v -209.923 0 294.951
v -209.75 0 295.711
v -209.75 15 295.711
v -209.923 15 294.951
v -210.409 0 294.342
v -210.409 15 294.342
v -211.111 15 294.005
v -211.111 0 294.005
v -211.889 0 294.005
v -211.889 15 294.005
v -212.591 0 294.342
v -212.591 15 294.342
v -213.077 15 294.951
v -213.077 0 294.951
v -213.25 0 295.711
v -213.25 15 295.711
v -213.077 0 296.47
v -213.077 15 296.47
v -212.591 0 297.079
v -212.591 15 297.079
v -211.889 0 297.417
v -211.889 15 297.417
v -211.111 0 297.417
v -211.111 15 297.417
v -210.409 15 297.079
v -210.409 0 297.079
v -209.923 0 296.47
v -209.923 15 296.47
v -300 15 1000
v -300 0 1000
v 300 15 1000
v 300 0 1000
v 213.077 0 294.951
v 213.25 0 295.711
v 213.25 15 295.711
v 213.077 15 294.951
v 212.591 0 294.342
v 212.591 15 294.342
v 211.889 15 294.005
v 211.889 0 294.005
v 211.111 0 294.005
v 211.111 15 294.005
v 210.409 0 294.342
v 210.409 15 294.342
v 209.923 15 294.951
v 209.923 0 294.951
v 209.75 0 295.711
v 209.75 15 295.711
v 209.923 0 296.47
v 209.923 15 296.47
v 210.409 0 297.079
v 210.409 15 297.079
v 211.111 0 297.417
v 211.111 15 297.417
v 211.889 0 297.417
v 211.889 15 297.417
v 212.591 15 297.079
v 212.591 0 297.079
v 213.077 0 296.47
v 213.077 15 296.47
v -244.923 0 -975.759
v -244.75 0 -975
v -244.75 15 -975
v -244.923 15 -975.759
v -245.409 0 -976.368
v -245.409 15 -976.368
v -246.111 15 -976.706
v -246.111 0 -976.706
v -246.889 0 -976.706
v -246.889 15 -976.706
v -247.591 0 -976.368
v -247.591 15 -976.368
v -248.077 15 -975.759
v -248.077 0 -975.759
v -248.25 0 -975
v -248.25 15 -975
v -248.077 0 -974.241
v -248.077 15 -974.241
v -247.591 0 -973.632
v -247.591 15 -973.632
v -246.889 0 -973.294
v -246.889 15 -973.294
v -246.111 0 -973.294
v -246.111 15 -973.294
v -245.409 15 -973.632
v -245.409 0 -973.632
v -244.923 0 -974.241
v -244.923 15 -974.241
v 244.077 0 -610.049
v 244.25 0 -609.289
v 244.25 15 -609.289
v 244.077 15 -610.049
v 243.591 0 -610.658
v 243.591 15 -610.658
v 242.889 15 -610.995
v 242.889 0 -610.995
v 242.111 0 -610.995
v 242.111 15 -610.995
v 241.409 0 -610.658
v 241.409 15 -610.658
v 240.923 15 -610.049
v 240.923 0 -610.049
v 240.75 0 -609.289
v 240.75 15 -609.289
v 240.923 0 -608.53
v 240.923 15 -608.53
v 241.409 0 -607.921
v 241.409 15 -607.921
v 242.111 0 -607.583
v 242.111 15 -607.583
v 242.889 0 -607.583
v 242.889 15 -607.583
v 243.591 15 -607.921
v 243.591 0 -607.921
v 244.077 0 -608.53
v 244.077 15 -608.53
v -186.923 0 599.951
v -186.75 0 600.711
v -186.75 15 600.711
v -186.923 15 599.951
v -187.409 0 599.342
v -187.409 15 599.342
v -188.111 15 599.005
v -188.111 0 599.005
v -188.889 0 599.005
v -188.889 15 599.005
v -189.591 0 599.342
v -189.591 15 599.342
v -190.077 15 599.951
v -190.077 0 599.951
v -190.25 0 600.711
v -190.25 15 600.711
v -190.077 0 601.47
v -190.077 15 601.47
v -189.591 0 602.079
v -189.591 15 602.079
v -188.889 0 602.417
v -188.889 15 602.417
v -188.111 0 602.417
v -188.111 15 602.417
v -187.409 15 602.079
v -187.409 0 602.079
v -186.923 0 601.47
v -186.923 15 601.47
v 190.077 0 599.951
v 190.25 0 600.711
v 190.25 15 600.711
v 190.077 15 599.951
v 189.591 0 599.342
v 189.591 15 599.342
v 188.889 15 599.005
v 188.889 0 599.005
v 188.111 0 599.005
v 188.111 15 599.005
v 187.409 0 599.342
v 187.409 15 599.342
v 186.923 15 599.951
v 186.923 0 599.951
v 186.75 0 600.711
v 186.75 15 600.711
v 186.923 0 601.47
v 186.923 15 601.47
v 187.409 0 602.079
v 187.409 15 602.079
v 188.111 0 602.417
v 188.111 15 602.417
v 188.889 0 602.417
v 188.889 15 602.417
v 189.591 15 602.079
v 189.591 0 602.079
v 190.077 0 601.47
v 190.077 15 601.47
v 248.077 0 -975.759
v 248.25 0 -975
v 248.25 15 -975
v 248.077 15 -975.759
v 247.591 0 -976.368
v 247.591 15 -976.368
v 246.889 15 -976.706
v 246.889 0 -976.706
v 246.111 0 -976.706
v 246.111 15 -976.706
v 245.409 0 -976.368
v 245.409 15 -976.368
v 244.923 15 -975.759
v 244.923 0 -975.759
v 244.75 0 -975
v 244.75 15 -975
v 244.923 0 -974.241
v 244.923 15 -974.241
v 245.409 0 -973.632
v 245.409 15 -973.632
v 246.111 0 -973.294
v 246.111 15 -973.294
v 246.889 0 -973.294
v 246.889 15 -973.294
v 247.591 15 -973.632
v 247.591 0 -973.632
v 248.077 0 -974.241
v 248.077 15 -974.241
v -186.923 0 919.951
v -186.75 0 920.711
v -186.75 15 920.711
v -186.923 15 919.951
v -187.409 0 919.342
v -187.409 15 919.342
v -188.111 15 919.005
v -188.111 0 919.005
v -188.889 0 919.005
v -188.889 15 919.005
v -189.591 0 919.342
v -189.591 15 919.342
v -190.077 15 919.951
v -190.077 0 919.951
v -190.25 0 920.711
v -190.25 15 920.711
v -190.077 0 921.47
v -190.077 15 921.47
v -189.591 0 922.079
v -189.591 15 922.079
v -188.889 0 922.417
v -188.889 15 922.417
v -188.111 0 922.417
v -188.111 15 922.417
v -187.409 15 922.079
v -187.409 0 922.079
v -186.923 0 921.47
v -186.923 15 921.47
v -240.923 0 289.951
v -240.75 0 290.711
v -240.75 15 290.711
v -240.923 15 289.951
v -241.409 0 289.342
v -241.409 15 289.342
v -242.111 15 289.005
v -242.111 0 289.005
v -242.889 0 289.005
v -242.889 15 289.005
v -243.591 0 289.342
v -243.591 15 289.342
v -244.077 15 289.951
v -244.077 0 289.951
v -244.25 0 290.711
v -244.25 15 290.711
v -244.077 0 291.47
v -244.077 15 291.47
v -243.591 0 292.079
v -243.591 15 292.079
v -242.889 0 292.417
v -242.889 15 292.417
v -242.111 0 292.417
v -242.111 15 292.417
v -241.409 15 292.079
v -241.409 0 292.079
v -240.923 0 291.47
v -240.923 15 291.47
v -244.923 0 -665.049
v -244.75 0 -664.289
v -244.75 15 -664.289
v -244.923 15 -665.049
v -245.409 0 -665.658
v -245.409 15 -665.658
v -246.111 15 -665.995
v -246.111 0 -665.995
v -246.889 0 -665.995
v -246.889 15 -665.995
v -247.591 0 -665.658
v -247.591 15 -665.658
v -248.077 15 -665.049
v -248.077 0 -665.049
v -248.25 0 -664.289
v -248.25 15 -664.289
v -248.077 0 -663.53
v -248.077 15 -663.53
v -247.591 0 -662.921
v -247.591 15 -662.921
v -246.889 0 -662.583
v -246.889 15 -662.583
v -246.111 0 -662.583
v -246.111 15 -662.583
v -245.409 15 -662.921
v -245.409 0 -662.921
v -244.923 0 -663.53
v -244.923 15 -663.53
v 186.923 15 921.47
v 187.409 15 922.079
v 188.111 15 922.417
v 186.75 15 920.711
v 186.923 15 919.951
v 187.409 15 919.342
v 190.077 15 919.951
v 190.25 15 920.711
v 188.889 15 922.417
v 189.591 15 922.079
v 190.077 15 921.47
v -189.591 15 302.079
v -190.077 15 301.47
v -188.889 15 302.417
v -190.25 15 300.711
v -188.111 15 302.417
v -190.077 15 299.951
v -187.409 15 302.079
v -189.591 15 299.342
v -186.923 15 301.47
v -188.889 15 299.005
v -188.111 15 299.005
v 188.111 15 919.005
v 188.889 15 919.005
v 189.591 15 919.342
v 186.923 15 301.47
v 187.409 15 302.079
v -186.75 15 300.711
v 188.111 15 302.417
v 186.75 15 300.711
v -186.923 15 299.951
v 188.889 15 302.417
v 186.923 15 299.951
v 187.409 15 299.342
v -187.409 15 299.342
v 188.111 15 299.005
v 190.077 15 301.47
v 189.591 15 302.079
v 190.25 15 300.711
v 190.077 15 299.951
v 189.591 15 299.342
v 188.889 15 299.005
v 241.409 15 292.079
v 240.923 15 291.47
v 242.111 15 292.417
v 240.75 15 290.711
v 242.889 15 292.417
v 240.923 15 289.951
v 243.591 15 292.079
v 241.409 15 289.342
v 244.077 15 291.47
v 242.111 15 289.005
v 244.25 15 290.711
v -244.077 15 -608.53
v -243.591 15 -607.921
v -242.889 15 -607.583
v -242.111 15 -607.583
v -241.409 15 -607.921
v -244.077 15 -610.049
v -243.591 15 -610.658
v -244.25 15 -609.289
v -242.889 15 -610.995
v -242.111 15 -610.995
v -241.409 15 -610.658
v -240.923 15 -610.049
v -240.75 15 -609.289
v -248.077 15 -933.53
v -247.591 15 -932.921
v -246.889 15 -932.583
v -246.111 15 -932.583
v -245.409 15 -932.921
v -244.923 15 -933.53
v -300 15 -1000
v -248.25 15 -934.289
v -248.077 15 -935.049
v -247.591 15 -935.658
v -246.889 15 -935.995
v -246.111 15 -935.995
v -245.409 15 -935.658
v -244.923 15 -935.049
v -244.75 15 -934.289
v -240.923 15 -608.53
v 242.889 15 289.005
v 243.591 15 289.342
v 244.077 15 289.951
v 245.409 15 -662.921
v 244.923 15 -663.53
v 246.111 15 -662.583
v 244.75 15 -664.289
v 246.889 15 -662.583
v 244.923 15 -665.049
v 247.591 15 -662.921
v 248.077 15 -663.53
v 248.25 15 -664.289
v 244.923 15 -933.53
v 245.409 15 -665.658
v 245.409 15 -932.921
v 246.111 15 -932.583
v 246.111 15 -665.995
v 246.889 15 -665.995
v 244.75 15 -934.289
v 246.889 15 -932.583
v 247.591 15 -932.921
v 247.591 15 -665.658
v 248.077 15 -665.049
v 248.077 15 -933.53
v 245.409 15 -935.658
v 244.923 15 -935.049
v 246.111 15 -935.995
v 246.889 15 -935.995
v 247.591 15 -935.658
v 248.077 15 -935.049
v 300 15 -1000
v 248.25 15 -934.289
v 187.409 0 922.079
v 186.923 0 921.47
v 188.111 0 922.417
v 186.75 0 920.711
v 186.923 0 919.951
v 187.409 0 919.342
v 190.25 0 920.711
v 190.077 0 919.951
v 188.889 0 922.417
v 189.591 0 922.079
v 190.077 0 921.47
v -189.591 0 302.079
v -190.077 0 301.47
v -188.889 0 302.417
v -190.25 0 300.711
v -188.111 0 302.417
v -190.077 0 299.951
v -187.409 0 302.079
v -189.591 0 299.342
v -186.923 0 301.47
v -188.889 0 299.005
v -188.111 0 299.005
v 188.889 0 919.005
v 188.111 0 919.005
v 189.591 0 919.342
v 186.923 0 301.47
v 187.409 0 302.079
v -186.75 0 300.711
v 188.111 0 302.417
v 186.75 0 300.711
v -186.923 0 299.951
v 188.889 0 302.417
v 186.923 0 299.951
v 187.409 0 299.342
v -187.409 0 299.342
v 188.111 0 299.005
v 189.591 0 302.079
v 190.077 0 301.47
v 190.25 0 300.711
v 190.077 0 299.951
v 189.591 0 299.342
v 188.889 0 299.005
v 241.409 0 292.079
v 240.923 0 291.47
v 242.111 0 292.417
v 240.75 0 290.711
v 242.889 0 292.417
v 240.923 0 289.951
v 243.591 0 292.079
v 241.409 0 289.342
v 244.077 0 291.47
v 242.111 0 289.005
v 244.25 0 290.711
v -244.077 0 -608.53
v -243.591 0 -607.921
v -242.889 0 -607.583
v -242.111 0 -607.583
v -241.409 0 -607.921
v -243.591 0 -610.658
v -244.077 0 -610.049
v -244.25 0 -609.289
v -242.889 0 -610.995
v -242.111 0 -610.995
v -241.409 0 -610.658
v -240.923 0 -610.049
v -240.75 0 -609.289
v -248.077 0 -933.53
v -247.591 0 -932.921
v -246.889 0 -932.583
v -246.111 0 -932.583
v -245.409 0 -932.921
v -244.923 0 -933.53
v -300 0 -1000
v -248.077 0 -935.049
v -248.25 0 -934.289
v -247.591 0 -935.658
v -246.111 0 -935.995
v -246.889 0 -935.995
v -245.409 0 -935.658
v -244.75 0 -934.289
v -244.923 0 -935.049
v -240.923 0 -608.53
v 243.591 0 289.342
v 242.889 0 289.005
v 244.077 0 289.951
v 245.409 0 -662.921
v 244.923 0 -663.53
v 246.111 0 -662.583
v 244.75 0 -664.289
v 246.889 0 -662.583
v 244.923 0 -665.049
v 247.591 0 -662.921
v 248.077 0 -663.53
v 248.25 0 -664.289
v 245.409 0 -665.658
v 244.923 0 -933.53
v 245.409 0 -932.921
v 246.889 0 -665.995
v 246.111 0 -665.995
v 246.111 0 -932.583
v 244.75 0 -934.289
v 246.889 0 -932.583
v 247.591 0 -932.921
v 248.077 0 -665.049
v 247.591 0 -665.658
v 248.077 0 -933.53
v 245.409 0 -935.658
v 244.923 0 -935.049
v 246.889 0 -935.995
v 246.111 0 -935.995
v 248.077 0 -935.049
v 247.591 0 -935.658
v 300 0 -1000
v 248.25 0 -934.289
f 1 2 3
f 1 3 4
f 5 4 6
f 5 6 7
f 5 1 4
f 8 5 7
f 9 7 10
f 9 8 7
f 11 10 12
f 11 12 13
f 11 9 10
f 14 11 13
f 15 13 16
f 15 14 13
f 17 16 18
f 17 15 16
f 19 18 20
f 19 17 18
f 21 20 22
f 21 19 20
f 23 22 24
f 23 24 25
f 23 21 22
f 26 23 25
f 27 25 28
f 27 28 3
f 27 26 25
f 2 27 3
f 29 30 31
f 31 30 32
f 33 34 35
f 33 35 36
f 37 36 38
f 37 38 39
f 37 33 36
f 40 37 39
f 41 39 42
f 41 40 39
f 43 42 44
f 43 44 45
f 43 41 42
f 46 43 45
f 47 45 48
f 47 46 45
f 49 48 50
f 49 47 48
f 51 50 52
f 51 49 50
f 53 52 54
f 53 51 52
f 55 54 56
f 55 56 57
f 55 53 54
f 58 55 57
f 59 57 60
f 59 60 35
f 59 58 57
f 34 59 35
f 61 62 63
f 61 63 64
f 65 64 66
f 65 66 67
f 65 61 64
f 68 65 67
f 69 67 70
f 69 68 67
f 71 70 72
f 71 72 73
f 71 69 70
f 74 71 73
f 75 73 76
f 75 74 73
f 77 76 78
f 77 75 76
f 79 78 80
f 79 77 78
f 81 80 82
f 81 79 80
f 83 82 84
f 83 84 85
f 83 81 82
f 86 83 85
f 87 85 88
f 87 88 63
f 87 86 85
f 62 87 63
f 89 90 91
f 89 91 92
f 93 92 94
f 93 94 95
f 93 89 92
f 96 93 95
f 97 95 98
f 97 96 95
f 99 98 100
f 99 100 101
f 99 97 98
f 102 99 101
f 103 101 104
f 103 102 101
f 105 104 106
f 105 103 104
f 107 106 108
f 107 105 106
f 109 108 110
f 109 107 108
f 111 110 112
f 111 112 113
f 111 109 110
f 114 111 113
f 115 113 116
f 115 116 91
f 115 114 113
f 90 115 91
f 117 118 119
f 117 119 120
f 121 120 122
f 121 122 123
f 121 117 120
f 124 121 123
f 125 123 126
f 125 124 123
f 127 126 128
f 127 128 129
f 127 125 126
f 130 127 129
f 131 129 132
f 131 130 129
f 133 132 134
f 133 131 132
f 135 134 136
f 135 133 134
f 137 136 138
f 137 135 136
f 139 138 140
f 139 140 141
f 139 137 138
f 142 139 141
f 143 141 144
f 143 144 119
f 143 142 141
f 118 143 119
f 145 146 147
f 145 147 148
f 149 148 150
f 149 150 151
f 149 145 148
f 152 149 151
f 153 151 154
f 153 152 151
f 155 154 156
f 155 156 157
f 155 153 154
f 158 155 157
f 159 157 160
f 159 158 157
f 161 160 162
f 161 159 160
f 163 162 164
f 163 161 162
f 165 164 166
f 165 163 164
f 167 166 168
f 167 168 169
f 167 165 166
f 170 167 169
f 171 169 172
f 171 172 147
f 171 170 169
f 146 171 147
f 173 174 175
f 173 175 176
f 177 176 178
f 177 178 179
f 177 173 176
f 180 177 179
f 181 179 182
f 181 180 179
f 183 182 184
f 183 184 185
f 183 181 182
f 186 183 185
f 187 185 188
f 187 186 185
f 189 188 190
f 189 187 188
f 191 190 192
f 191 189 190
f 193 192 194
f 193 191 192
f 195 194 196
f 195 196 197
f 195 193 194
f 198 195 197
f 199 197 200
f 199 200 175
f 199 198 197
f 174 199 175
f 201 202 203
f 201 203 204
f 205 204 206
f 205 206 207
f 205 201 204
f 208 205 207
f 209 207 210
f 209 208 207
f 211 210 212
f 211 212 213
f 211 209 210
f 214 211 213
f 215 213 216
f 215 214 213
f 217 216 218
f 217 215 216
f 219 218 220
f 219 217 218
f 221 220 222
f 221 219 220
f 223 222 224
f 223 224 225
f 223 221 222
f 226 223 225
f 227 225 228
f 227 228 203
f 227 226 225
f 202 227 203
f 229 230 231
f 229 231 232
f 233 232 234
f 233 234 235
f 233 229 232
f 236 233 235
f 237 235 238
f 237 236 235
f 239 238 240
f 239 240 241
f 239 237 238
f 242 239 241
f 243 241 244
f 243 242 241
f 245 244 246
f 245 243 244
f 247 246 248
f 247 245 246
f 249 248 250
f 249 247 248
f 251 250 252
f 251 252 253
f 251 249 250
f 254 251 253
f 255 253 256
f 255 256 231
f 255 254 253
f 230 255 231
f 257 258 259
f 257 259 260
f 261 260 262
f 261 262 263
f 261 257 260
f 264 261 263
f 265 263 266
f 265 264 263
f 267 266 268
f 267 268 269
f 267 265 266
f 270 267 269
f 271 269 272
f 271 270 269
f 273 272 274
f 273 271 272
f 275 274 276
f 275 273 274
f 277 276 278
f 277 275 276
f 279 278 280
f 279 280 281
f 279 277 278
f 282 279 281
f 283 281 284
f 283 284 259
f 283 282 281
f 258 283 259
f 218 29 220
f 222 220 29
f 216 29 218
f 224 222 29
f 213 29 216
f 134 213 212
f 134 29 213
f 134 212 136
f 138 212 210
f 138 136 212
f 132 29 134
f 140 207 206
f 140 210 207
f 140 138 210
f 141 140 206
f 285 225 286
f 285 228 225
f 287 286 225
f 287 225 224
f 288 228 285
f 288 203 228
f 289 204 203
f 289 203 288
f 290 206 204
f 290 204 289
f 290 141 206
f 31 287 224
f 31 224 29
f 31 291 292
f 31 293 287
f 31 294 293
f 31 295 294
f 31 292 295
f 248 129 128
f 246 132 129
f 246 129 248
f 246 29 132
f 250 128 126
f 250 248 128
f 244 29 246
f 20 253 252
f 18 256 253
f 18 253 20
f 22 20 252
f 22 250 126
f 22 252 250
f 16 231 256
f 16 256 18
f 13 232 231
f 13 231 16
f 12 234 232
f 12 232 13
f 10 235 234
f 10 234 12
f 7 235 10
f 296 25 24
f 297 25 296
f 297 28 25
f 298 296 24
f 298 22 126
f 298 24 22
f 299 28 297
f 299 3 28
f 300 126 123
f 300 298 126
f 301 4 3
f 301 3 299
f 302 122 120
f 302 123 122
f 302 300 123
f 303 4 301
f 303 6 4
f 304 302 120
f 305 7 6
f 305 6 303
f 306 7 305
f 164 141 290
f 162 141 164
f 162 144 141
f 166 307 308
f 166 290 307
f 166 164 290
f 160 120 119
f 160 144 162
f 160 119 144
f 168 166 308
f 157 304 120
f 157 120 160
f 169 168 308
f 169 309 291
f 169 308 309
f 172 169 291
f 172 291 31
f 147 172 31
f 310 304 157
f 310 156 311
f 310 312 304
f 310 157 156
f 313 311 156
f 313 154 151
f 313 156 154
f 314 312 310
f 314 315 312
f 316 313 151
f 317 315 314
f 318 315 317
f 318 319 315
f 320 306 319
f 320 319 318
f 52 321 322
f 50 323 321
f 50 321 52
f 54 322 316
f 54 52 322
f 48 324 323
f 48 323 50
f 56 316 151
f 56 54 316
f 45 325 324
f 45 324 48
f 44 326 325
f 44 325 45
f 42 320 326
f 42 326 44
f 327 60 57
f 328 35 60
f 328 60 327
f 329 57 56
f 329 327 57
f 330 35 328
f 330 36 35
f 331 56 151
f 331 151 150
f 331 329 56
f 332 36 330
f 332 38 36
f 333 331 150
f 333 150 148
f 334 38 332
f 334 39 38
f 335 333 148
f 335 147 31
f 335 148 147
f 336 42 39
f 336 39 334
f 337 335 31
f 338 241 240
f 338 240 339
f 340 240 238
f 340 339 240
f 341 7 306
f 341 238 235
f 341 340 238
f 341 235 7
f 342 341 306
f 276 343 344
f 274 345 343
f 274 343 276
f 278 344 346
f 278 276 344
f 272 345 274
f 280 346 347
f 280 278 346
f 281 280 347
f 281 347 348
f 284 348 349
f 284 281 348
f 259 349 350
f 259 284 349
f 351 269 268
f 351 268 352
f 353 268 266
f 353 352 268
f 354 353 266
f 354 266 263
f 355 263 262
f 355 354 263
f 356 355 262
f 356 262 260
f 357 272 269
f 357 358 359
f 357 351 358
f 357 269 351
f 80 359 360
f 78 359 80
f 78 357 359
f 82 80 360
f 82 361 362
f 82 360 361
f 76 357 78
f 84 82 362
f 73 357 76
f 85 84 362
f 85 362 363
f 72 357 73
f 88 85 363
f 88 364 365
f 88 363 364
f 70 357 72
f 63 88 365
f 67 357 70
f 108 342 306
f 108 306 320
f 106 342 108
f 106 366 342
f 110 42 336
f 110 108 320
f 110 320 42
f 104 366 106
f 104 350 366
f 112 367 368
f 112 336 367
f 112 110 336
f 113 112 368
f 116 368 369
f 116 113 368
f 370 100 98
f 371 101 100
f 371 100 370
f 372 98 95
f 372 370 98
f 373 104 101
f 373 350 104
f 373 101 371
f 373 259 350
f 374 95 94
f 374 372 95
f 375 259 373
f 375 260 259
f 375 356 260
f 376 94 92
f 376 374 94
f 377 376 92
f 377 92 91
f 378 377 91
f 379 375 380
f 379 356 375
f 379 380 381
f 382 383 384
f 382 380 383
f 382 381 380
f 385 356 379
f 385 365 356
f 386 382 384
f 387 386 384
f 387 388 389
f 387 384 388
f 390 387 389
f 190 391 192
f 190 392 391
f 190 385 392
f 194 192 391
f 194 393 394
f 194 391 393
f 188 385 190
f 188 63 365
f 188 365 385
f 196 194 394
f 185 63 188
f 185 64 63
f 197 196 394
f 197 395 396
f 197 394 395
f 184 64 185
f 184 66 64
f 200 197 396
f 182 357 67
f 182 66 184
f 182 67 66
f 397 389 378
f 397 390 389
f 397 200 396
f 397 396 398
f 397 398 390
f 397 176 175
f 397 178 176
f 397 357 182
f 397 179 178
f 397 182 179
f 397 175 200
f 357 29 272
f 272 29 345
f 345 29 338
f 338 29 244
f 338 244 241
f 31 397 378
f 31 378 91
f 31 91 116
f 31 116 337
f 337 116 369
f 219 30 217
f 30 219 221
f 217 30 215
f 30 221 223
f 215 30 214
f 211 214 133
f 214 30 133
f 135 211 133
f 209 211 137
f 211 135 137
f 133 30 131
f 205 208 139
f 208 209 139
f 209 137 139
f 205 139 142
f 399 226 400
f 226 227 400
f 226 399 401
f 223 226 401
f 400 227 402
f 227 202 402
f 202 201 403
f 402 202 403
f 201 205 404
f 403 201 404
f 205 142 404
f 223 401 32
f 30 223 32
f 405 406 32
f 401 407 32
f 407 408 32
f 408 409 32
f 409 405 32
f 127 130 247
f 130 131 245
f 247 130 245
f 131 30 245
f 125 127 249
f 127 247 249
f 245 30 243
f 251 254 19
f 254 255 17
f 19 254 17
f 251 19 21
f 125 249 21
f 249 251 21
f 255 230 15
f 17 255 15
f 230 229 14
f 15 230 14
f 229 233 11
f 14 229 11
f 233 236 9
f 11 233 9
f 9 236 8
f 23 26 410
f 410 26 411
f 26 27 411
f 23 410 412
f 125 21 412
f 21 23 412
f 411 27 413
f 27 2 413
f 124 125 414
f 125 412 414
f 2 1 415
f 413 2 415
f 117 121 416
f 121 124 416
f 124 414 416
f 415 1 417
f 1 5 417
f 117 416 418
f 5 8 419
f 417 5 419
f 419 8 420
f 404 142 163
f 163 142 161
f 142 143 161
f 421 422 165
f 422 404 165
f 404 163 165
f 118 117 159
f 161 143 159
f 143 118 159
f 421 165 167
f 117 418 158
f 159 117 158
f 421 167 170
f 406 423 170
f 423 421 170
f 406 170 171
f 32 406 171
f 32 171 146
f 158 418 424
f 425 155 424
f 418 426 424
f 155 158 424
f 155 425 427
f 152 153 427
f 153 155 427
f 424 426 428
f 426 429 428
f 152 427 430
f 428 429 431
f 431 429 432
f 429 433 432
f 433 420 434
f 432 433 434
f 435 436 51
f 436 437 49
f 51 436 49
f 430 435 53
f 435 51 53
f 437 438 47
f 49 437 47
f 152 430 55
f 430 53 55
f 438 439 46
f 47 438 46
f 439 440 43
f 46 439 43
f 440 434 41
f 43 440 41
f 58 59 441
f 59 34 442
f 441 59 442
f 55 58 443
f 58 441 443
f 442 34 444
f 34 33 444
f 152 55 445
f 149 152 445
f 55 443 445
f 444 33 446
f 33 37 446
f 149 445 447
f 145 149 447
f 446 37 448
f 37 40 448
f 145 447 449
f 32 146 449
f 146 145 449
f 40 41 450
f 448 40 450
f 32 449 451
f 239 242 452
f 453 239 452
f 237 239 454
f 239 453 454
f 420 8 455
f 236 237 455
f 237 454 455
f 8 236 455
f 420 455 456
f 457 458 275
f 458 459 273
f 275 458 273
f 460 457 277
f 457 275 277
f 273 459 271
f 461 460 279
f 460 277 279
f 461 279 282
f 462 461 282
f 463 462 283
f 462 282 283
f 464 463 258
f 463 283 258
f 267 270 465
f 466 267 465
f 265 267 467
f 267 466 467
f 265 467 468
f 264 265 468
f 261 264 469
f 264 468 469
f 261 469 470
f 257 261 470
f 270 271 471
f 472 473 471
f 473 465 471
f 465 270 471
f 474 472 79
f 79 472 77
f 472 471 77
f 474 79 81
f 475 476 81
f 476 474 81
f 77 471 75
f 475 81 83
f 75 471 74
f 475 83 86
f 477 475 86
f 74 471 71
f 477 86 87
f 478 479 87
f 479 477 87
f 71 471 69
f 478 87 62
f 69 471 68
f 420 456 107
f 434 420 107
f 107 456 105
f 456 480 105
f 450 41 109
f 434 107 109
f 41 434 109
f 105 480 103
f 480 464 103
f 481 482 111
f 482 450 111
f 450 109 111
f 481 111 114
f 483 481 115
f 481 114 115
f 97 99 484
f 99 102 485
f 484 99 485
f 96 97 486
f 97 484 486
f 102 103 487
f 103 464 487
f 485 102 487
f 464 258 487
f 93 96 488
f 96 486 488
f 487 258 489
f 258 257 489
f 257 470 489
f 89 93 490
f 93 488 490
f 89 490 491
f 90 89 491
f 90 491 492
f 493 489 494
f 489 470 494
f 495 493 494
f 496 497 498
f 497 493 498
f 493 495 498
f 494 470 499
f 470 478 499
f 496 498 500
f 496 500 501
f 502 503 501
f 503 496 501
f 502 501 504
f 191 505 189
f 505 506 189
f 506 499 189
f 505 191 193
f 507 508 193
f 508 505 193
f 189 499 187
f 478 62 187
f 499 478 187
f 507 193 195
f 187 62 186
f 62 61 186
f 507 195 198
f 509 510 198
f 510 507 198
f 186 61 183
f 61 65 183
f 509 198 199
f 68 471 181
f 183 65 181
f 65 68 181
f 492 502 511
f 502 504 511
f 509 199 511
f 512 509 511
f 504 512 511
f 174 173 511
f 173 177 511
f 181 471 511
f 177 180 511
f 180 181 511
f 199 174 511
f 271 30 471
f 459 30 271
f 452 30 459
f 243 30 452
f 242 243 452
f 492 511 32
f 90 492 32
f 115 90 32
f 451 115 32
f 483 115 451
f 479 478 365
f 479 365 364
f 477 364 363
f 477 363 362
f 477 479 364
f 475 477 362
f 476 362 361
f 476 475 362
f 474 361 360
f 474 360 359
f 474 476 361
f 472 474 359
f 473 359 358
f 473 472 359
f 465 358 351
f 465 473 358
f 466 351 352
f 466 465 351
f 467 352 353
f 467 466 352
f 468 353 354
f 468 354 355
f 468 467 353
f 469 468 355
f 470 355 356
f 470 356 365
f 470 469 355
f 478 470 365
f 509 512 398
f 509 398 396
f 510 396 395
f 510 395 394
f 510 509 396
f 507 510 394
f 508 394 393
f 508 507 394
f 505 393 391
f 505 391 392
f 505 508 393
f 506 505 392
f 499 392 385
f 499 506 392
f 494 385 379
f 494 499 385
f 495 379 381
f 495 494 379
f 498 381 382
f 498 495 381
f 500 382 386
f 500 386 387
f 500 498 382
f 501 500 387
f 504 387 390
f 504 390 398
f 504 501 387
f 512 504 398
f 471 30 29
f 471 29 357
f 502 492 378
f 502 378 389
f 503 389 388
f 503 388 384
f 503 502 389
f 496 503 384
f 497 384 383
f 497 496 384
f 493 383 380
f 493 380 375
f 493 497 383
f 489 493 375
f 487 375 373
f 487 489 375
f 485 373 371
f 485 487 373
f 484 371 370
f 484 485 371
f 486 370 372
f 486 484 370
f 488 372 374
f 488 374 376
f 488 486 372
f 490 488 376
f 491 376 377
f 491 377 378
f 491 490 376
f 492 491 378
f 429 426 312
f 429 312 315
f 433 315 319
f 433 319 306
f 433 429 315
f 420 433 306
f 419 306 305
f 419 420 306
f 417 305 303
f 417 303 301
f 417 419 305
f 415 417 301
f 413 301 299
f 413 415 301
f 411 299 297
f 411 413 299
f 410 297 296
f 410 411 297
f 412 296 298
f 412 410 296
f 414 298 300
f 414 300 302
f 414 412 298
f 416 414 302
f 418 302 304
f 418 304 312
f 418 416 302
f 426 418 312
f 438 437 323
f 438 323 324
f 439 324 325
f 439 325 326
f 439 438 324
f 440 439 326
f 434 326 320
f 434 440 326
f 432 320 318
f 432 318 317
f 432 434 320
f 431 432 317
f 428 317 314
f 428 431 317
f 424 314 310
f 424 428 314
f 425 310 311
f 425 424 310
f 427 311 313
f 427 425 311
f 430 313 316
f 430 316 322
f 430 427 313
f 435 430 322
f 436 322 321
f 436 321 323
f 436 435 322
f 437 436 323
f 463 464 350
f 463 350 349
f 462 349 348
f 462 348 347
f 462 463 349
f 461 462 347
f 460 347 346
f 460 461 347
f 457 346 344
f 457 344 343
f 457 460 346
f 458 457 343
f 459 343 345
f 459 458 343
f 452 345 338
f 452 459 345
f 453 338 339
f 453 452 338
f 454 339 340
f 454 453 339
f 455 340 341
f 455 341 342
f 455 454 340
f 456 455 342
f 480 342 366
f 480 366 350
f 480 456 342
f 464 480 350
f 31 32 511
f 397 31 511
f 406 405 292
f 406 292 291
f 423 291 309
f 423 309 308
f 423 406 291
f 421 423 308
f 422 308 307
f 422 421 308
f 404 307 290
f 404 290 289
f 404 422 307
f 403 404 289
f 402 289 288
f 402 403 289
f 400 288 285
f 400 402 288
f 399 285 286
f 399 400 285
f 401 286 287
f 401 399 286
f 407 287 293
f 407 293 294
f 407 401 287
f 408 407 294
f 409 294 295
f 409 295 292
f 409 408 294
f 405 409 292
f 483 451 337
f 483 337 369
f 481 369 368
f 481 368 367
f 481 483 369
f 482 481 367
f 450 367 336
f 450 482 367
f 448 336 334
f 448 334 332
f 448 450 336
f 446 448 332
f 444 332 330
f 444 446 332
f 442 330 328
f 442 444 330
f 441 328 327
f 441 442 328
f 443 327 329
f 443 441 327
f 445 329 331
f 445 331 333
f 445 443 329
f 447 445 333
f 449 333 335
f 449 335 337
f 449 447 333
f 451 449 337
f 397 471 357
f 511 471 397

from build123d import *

# Parameters (mm, degrees)
SKETCH1_W           = 600
SKETCH1_H           = 2000
SKETCH1_R           = 1.75
BOSS_EXTRUDE1_DEPTH = 15


with BuildPart() as part:
    # Sketch1 → Boss-Extrude1 (new body)
    with BuildSketch(Plane(origin=(0, 0, 0), x_dir=(1, 0, 0), z_dir=(0, 1, 0))):
        Rectangle(SKETCH1_W, SKETCH1_H)
        with Locations((-188.5, -920.710678119)):
            Circle(SKETCH1_R, mode=Mode.SUBTRACT)
        with Locations((188.5, -920.710678119)):
            Circle(SKETCH1_R, mode=Mode.SUBTRACT)
        with Locations((188.5, -600.710678119)):
            Circle(SKETCH1_R, mode=Mode.SUBTRACT)
        with Locations((-188.5, -300.710678119)):
            Circle(SKETCH1_R, mode=Mode.SUBTRACT)
        with Locations((-188.5, -600.710678119)):
            Circle(SKETCH1_R, mode=Mode.SUBTRACT)
        with Locations((188.5, -300.710678119)):
            Circle(SKETCH1_R, mode=Mode.SUBTRACT)
        with Locations((-211.5, -295.710678119)):
            Circle(SKETCH1_R, mode=Mode.SUBTRACT)
        with Locations((211.5, -295.710678119)):
            Circle(SKETCH1_R, mode=Mode.SUBTRACT)
        with Locations((-242.5, -290.710678119)):
            Circle(SKETCH1_R, mode=Mode.SUBTRACT)
        with Locations((-242.5, 609.289321881)):
            Circle(SKETCH1_R, mode=Mode.SUBTRACT)
        with Locations((242.5, -290.710678119)):
            Circle(SKETCH1_R, mode=Mode.SUBTRACT)
        with Locations((242.5, 609.289321881)):
            Circle(SKETCH1_R, mode=Mode.SUBTRACT)
        with Locations((246.5, 664.289321881)):
            Circle(SKETCH1_R, mode=Mode.SUBTRACT)
        with Locations((-246.5, 664.289321881)):
            Circle(SKETCH1_R, mode=Mode.SUBTRACT)
        with Locations((-246.5, 934.289321881)):
            Circle(SKETCH1_R, mode=Mode.SUBTRACT)
        with Locations((-246.5, 975)):
            Circle(SKETCH1_R, mode=Mode.SUBTRACT)
        with Locations((246.5, 934.289321881)):
            Circle(SKETCH1_R, mode=Mode.SUBTRACT)
        with Locations((246.5, 975)):
            Circle(SKETCH1_R, mode=Mode.SUBTRACT)
    extrude(amount=BOSS_EXTRUDE1_DEPTH)


solid = part.part
